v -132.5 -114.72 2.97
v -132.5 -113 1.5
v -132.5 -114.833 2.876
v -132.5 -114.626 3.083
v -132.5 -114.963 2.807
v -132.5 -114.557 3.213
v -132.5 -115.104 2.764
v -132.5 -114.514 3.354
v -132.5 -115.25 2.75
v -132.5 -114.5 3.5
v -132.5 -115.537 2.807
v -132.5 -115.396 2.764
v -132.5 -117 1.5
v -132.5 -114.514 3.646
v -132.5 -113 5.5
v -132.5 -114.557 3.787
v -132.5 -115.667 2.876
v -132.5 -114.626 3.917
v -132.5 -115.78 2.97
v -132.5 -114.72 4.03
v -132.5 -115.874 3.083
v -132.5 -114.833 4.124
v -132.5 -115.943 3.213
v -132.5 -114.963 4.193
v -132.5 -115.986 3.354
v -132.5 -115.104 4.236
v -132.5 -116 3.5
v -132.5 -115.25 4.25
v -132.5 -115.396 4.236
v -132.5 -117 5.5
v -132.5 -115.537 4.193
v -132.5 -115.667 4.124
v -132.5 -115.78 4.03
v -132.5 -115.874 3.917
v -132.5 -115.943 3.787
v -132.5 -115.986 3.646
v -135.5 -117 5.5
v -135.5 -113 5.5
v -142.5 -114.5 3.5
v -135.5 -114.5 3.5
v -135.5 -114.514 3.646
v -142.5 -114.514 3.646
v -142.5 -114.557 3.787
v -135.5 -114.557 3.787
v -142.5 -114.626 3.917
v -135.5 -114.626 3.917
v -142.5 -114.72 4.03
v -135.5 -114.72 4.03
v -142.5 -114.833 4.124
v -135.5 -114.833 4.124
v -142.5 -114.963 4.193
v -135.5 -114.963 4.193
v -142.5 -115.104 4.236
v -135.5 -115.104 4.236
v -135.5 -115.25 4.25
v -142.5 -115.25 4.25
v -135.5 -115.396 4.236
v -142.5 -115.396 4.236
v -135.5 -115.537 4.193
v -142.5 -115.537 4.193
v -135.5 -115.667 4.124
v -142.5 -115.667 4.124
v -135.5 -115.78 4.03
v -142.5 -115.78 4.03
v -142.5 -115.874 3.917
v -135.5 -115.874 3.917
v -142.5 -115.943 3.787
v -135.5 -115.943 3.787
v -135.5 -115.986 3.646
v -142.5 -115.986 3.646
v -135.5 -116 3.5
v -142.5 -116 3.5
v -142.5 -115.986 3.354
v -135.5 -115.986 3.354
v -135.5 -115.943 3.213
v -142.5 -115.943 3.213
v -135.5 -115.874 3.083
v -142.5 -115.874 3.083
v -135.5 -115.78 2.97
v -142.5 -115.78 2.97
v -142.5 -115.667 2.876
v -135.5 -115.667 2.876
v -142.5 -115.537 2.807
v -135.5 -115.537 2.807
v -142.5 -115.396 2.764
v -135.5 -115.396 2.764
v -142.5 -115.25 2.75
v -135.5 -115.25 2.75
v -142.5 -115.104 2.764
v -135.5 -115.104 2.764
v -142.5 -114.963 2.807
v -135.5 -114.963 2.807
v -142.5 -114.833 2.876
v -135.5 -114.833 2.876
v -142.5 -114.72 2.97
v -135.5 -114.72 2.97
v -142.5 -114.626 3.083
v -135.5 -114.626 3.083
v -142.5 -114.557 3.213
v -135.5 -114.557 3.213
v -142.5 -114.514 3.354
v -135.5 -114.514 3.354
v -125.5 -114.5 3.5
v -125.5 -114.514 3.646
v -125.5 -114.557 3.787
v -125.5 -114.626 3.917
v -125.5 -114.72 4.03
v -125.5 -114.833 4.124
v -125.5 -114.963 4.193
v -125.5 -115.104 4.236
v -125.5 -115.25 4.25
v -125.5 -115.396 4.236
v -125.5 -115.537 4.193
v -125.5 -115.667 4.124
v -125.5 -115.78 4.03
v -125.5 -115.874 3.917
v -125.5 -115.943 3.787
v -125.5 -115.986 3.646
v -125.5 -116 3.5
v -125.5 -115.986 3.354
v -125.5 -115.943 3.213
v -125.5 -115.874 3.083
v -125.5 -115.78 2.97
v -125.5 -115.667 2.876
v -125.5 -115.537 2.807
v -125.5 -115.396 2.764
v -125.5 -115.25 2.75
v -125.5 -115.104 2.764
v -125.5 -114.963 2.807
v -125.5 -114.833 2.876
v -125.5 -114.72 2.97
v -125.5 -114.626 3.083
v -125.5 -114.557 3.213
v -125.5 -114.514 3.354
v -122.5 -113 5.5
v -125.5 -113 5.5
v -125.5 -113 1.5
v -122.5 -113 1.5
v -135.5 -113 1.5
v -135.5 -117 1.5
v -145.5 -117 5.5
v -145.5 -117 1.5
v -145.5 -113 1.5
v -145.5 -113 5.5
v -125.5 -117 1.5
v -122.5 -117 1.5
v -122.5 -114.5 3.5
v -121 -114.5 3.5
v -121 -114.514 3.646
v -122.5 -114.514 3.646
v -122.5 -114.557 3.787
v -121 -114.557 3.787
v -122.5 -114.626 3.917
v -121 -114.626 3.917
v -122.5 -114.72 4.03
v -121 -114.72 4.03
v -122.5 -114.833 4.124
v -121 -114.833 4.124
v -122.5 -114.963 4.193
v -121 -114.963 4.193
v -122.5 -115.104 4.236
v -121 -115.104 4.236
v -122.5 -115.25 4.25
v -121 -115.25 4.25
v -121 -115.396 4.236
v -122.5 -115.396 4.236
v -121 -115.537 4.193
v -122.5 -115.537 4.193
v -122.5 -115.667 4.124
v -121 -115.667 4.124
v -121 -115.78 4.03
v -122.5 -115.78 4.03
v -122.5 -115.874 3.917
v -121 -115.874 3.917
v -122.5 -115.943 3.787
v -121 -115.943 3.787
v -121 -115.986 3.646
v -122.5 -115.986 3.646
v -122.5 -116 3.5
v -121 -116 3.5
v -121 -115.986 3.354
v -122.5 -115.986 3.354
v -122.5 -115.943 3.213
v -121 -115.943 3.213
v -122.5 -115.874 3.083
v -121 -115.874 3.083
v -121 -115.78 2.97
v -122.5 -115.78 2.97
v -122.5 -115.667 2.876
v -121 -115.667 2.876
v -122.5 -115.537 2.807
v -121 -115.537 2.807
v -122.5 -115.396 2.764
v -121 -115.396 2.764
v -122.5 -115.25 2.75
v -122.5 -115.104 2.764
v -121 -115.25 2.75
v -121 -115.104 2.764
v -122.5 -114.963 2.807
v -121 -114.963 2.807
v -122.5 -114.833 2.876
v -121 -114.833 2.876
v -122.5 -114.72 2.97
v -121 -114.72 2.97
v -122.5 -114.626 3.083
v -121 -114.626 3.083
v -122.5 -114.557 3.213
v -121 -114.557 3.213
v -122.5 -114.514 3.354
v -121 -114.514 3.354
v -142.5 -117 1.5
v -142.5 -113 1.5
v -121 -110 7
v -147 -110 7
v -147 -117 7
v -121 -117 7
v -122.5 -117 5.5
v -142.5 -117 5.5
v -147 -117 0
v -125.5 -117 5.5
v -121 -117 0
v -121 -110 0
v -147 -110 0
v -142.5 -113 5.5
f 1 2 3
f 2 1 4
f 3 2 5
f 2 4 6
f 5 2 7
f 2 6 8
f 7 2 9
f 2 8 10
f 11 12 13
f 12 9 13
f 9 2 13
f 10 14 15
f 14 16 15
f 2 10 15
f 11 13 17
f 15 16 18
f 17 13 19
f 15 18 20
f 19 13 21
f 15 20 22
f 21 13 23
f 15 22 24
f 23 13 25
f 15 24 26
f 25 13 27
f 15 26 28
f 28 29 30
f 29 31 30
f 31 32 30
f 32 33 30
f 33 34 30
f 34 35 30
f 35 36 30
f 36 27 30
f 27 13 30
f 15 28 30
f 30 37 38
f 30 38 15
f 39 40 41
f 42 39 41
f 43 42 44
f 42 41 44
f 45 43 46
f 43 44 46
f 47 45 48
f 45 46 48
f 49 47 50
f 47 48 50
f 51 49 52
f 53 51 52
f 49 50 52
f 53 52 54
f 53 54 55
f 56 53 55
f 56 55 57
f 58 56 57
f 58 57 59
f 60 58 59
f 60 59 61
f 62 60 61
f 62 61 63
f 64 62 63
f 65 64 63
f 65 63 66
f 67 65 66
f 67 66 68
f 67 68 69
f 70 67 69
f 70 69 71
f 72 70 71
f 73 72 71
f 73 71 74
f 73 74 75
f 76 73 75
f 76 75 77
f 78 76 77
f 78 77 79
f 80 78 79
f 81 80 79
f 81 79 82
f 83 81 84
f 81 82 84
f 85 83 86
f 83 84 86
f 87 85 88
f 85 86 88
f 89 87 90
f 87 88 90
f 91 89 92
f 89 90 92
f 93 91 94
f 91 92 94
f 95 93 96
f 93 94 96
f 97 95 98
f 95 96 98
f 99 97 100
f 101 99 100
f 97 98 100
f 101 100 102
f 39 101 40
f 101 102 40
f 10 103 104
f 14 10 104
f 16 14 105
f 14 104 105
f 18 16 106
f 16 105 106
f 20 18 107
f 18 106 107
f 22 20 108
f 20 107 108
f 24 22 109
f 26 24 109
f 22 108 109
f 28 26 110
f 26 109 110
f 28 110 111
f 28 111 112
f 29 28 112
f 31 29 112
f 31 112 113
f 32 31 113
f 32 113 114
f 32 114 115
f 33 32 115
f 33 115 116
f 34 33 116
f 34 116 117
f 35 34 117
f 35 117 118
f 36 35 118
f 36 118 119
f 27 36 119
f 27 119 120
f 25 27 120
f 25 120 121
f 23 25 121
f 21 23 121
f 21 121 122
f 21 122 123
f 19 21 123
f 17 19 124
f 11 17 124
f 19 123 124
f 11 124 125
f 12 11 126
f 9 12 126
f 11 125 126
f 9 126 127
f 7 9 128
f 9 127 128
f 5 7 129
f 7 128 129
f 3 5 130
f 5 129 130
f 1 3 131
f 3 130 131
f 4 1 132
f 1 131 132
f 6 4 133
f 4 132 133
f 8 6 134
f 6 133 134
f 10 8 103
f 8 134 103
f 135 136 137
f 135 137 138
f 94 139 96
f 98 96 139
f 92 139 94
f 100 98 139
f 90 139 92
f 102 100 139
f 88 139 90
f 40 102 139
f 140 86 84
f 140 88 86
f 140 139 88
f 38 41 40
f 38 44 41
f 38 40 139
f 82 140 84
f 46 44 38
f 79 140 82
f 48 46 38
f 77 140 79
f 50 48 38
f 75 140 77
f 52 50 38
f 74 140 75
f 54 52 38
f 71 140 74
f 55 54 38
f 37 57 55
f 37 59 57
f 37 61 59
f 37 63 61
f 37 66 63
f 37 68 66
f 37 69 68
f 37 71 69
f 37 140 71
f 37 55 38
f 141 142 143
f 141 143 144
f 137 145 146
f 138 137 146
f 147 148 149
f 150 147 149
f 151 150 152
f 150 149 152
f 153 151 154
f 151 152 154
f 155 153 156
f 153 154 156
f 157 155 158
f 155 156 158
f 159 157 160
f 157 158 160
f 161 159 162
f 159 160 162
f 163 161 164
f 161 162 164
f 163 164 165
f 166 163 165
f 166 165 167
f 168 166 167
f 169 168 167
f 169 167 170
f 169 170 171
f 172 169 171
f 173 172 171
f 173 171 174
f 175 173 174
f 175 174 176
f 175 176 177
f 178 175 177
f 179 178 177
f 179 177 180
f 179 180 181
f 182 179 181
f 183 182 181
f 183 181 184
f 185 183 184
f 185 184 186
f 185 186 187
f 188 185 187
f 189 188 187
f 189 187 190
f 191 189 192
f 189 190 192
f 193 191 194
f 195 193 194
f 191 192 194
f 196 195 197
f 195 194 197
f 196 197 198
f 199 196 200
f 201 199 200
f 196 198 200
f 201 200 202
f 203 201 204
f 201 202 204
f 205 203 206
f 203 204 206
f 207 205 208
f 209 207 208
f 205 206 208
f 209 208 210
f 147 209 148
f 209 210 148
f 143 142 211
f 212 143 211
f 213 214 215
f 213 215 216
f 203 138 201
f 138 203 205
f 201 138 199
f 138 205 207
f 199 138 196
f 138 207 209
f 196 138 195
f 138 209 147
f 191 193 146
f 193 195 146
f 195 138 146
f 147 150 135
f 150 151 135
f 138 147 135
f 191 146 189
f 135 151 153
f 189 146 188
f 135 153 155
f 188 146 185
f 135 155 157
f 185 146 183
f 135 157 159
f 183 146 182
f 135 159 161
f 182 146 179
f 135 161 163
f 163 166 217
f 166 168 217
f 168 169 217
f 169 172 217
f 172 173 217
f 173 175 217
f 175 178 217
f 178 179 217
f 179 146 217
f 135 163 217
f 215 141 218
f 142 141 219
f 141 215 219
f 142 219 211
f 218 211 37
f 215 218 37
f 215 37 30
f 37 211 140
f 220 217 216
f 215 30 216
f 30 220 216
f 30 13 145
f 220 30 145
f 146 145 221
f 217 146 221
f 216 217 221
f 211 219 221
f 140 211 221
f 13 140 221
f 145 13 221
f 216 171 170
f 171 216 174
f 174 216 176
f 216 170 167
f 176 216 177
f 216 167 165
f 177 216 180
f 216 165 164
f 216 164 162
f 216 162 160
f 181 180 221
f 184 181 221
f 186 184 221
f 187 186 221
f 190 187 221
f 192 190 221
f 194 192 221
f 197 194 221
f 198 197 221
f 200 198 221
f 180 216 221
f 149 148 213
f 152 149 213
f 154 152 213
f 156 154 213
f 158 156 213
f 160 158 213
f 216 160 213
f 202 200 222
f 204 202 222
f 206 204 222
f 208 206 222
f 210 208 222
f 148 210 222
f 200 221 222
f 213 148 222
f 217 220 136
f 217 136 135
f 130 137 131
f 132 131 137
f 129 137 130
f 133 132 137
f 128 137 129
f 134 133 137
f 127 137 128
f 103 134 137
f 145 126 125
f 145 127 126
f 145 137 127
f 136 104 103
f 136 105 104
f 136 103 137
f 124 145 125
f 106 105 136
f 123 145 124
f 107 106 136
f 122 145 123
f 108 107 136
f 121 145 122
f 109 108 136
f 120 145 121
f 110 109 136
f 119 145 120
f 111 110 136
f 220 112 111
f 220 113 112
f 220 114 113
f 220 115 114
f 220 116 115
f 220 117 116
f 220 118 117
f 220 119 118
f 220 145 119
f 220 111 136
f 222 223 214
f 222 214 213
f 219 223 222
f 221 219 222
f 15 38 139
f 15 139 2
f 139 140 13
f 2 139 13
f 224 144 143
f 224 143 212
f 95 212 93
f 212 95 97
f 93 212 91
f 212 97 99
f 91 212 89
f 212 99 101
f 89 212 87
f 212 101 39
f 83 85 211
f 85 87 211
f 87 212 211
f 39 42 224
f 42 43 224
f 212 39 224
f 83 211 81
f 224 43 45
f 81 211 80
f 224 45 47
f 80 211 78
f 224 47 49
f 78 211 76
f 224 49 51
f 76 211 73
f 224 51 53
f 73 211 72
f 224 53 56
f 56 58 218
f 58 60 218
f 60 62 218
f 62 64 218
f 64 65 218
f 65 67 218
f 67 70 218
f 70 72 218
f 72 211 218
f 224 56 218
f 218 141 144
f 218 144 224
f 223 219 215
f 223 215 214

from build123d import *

# Parameters (mm, degrees)
SKETCH041_W      = 26
SKETCH041_H      = 7
EXTRUDE032_DEPTH = 7
SKETCH070_W      = 3
SKETCH070_H      = 4
POCKET012_DEPTH  = 4
SKETCH071_R      = 0.75
HOLE017_DEPTH    = 24


with BuildPart() as part:
    # Sketch041 → Extrude032 (new body)
    with BuildSketch(Plane.XY):
        with Locations((-134, -113.5)):
            Rectangle(SKETCH041_W, SKETCH041_H)
    extrude(amount=EXTRUDE032_DEPTH)

    # Sketch070 (on Face3 of BaseFeature013) → Pocket012 (cut)
    with BuildSketch(Plane.XZ.offset(117)):
        with Locations((-134.000002, 3.5)):
            Rectangle(SKETCH070_W, SKETCH070_H)
        with Locations((-144.000002, 3.5)):
            Rectangle(SKETCH070_W, SKETCH070_H)
        with Locations((-124.000002, 3.5)):
            Rectangle(SKETCH070_W, SKETCH070_H)
    extrude(amount=-POCKET012_DEPTH, mode=Mode.SUBTRACT)

    # Sketch071 (on Face3 of Pocket012) → Hole017 (cut)
    with BuildSketch(Plane.YZ.offset(-121)):
        with Locations((-115.249997, 3.5)):
            Circle(SKETCH071_R)
    extrude(amount=-HOLE017_DEPTH, mode=Mode.SUBTRACT)


solid = part.part
